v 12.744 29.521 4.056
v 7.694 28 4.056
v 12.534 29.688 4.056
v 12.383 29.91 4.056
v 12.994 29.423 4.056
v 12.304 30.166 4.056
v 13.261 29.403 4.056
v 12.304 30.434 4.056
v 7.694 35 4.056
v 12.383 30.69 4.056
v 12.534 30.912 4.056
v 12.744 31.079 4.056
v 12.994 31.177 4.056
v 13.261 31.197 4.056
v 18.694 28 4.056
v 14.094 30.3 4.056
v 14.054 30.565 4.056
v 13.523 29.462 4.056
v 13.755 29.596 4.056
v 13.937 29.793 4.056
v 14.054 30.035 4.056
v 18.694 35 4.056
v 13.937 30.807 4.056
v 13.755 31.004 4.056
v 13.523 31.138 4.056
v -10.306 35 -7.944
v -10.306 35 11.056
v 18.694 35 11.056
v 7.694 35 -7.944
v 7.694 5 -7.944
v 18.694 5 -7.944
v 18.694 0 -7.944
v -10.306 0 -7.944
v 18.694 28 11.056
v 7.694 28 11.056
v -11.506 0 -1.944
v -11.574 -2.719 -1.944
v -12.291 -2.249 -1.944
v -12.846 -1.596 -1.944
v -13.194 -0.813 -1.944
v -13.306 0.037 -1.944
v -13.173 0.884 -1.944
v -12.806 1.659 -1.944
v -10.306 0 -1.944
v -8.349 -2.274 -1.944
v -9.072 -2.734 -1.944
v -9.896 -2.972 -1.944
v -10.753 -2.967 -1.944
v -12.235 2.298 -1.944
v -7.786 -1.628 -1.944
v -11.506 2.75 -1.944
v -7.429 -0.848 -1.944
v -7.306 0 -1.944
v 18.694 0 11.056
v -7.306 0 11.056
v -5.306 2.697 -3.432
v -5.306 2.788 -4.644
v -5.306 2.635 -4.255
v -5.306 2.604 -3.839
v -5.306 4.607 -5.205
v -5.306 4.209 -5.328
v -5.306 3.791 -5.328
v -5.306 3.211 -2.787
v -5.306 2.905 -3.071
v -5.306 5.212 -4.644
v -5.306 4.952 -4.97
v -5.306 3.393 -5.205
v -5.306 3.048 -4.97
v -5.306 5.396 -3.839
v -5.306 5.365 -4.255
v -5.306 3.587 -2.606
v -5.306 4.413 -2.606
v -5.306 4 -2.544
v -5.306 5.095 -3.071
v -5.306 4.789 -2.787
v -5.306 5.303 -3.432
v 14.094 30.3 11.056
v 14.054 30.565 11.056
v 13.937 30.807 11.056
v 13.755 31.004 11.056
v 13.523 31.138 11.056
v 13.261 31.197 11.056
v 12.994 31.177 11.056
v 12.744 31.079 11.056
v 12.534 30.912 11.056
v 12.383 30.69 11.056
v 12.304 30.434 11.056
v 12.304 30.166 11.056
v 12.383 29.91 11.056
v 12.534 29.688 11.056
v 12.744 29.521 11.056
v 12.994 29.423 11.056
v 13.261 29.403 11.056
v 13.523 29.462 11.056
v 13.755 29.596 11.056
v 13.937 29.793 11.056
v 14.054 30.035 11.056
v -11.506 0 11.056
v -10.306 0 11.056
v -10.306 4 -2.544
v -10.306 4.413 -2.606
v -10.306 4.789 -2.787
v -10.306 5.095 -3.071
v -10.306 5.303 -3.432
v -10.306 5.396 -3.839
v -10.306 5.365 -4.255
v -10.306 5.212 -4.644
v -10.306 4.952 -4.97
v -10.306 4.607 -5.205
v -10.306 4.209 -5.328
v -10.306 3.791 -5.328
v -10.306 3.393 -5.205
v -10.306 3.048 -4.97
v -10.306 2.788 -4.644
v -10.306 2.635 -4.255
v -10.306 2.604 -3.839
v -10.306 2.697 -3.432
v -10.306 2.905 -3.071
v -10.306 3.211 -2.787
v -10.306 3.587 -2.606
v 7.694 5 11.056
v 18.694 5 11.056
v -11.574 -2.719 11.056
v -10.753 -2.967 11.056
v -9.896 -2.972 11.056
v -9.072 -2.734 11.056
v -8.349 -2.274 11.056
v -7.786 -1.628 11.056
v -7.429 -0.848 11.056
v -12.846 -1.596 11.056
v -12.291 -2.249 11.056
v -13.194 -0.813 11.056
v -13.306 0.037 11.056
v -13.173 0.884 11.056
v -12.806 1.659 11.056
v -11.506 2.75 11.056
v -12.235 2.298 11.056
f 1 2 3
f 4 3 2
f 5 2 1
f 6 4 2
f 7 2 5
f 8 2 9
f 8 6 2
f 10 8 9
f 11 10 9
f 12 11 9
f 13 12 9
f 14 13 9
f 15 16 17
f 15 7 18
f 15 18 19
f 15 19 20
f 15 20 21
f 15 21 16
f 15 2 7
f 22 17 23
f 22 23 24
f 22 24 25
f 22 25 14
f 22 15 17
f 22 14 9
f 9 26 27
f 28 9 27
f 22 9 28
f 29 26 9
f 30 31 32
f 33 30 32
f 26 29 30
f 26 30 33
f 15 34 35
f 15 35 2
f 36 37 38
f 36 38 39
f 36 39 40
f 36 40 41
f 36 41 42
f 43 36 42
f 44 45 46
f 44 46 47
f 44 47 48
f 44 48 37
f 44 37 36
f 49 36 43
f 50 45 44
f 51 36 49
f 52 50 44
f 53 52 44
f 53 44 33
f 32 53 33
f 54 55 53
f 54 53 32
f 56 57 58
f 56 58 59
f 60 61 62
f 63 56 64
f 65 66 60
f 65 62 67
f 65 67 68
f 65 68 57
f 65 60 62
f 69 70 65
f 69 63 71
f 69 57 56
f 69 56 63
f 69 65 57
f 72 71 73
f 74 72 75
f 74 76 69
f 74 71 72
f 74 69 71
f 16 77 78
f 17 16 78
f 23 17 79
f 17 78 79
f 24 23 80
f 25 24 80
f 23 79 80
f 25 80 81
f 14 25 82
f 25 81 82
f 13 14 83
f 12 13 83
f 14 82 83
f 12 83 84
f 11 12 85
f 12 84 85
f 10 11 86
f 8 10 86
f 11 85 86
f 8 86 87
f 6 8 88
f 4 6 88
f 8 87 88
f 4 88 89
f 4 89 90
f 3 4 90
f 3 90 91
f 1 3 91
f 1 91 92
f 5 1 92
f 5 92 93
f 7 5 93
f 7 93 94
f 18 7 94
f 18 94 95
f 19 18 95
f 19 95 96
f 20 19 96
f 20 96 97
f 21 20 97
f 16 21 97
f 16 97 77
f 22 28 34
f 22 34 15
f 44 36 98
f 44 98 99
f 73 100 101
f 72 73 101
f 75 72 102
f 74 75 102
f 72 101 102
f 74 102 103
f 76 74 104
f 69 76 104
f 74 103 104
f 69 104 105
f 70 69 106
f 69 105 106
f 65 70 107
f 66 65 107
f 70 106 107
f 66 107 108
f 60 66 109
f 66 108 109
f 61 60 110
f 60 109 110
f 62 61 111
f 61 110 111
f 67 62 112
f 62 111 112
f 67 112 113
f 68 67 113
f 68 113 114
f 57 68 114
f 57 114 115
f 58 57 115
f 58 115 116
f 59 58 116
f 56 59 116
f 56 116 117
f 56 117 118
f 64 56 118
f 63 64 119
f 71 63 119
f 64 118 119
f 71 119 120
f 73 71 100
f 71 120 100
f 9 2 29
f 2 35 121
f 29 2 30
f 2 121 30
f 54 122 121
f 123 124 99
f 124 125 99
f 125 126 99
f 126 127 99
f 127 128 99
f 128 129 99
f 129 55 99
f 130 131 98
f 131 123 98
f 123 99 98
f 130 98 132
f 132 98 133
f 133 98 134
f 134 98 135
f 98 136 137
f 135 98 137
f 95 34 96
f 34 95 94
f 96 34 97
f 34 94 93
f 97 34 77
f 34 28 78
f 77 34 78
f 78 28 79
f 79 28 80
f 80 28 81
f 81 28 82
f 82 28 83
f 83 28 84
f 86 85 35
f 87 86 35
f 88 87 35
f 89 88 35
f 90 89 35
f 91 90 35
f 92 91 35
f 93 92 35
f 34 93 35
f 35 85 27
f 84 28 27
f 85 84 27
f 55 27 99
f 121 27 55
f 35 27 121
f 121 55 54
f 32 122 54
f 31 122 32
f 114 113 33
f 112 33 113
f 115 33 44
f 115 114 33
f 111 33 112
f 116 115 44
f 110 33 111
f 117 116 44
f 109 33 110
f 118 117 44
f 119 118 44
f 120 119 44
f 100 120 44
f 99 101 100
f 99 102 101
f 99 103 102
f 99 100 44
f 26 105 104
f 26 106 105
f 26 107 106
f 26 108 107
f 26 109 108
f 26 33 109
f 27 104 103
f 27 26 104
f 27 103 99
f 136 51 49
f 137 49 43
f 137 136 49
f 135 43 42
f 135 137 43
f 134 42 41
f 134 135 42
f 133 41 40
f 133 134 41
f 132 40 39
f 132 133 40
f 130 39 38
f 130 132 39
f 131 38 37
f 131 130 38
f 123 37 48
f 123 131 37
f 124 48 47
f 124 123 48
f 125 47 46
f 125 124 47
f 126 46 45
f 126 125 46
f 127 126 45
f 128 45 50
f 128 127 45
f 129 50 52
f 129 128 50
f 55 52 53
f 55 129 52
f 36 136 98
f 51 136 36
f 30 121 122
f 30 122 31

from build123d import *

# Parameters (mm, degrees)
SKETCH1_W           = 18
SKETCH1_H           = 19
BOSS_EXTRUDE1_DEPTH = 35
SKETCH2_W           = 19
SKETCH2_H           = 5
SKETCH2_H_2         = 7
BOSS_EXTRUDE2_DEPTH = 11
SKETCH3_W           = 12
SKETCH3_H           = 7
CUT_EXTRUDE1_DEPTH  = 11
SKETCH7_W           = 3
SKETCH7_H           = 19
SKETCH9_W           = 39
SKETCH9_H           = 6
CUT_EXTRUDE3_DEPTH  = 4
SKETCH10_W          = 6
SKETCH10_H          = 35
CUT_EXTRUDE4_DEPTH  = 4
SKETCH11_W          = 1.2
SKETCH11_H          = 19
CUT_EXTRUDE5_DEPTH  = 35
SKETCH12_R          = 1.4
CUT_EXTRUDE6_DEPTH  = 5
SKETCH13_R          = 0.9
CUT_EXTRUDE7_DEPTH  = 20


with BuildPart() as part:
    # Sketch1 → Boss-Extrude1 (new body)
    with BuildSketch(Plane(origin=(0, 0, 0), x_dir=(1, 0, 0), z_dir=(0, 1, 0))):
        with Locations((-1.30615381, -1.556170273)):
            Rectangle(SKETCH1_W, SKETCH1_H)
    extrude(amount=BOSS_EXTRUDE1_DEPTH)

    # Sketch2 → Boss-Extrude2 (add)
    with BuildSketch(Plane(origin=(7.69384619, 0, 0), x_dir=(0, 0, -1), z_dir=(1, 0, 0))):
        with Locations((-1.556170273, 2.5)):
            Rectangle(SKETCH2_W, SKETCH2_H)
        with Locations((-1.556170273, 31.5)):
            Rectangle(SKETCH2_W, SKETCH2_H_2)
    extrude(amount=BOSS_EXTRUDE2_DEPTH)

    # Sketch3 → Cut-Extrude1 (cut)
    with BuildSketch(Plane(origin=(18.69384619, 0, 0), x_dir=(0, 0, -1), z_dir=(1, 0, 0))):
        with Locations((1.943829727, 31.5)):
            Rectangle(SKETCH3_W, SKETCH3_H)
    extrude(amount=-CUT_EXTRUDE1_DEPTH, mode=Mode.SUBTRACT)

    # Sketch7 → Revolve2 (revolve)
    with BuildSketch(Plane.XZ):
        with Locations((-8.80615381, 1.556170273)):
            Rectangle(SKETCH7_W, SKETCH7_H)
    revolve(axis=Axis((-10.30615381, 0, -7.943829727), (0, 0, 1)))

    # Sketch9 → Cut-Extrude3 (cut, through all)
    with BuildSketch(Plane.XZ):
        with Locations((-0.80615381, -4.943829727)):
            Rectangle(SKETCH9_W, SKETCH9_H)
    extrude(amount=CUT_EXTRUDE3_DEPTH, mode=Mode.SUBTRACT)

    # Sketch10 → Cut-Extrude4 (cut, through all)
    with BuildSketch(Plane.ZY.offset(10.30615381)):
        with Locations((-4.943829727, 17.5)):
            Rectangle(SKETCH10_W, SKETCH10_H)
    extrude(amount=CUT_EXTRUDE4_DEPTH, mode=Mode.SUBTRACT)

    # Sketch11 → Cut-Extrude5 (cut)
    with BuildSketch(Plane(origin=(0, 35, 0), x_dir=(1, 0, 0), z_dir=(0, 1, 0))):
        with Locations((-10.90615381, -1.556170273)):
            Rectangle(SKETCH11_W, SKETCH11_H)
    extrude(amount=-CUT_EXTRUDE5_DEPTH, mode=Mode.SUBTRACT)

    # Sketch12 → Cut-Extrude6 (cut)
    with BuildSketch(Plane.ZY.offset(10.30615381)):
        with Locations((-3.943829727, 4)):
            Circle(SKETCH12_R)
    extrude(amount=-CUT_EXTRUDE6_DEPTH, mode=Mode.SUBTRACT)

    # Sketch13 → Cut-Extrude7 (cut, through all)
    with BuildSketch(Plane.XY.offset(11.056170273)):
        with Locations((13.19384619, 30.3)):
            Circle(SKETCH13_R)
    extrude(amount=-CUT_EXTRUDE7_DEPTH, mode=Mode.SUBTRACT)


solid = part.part
